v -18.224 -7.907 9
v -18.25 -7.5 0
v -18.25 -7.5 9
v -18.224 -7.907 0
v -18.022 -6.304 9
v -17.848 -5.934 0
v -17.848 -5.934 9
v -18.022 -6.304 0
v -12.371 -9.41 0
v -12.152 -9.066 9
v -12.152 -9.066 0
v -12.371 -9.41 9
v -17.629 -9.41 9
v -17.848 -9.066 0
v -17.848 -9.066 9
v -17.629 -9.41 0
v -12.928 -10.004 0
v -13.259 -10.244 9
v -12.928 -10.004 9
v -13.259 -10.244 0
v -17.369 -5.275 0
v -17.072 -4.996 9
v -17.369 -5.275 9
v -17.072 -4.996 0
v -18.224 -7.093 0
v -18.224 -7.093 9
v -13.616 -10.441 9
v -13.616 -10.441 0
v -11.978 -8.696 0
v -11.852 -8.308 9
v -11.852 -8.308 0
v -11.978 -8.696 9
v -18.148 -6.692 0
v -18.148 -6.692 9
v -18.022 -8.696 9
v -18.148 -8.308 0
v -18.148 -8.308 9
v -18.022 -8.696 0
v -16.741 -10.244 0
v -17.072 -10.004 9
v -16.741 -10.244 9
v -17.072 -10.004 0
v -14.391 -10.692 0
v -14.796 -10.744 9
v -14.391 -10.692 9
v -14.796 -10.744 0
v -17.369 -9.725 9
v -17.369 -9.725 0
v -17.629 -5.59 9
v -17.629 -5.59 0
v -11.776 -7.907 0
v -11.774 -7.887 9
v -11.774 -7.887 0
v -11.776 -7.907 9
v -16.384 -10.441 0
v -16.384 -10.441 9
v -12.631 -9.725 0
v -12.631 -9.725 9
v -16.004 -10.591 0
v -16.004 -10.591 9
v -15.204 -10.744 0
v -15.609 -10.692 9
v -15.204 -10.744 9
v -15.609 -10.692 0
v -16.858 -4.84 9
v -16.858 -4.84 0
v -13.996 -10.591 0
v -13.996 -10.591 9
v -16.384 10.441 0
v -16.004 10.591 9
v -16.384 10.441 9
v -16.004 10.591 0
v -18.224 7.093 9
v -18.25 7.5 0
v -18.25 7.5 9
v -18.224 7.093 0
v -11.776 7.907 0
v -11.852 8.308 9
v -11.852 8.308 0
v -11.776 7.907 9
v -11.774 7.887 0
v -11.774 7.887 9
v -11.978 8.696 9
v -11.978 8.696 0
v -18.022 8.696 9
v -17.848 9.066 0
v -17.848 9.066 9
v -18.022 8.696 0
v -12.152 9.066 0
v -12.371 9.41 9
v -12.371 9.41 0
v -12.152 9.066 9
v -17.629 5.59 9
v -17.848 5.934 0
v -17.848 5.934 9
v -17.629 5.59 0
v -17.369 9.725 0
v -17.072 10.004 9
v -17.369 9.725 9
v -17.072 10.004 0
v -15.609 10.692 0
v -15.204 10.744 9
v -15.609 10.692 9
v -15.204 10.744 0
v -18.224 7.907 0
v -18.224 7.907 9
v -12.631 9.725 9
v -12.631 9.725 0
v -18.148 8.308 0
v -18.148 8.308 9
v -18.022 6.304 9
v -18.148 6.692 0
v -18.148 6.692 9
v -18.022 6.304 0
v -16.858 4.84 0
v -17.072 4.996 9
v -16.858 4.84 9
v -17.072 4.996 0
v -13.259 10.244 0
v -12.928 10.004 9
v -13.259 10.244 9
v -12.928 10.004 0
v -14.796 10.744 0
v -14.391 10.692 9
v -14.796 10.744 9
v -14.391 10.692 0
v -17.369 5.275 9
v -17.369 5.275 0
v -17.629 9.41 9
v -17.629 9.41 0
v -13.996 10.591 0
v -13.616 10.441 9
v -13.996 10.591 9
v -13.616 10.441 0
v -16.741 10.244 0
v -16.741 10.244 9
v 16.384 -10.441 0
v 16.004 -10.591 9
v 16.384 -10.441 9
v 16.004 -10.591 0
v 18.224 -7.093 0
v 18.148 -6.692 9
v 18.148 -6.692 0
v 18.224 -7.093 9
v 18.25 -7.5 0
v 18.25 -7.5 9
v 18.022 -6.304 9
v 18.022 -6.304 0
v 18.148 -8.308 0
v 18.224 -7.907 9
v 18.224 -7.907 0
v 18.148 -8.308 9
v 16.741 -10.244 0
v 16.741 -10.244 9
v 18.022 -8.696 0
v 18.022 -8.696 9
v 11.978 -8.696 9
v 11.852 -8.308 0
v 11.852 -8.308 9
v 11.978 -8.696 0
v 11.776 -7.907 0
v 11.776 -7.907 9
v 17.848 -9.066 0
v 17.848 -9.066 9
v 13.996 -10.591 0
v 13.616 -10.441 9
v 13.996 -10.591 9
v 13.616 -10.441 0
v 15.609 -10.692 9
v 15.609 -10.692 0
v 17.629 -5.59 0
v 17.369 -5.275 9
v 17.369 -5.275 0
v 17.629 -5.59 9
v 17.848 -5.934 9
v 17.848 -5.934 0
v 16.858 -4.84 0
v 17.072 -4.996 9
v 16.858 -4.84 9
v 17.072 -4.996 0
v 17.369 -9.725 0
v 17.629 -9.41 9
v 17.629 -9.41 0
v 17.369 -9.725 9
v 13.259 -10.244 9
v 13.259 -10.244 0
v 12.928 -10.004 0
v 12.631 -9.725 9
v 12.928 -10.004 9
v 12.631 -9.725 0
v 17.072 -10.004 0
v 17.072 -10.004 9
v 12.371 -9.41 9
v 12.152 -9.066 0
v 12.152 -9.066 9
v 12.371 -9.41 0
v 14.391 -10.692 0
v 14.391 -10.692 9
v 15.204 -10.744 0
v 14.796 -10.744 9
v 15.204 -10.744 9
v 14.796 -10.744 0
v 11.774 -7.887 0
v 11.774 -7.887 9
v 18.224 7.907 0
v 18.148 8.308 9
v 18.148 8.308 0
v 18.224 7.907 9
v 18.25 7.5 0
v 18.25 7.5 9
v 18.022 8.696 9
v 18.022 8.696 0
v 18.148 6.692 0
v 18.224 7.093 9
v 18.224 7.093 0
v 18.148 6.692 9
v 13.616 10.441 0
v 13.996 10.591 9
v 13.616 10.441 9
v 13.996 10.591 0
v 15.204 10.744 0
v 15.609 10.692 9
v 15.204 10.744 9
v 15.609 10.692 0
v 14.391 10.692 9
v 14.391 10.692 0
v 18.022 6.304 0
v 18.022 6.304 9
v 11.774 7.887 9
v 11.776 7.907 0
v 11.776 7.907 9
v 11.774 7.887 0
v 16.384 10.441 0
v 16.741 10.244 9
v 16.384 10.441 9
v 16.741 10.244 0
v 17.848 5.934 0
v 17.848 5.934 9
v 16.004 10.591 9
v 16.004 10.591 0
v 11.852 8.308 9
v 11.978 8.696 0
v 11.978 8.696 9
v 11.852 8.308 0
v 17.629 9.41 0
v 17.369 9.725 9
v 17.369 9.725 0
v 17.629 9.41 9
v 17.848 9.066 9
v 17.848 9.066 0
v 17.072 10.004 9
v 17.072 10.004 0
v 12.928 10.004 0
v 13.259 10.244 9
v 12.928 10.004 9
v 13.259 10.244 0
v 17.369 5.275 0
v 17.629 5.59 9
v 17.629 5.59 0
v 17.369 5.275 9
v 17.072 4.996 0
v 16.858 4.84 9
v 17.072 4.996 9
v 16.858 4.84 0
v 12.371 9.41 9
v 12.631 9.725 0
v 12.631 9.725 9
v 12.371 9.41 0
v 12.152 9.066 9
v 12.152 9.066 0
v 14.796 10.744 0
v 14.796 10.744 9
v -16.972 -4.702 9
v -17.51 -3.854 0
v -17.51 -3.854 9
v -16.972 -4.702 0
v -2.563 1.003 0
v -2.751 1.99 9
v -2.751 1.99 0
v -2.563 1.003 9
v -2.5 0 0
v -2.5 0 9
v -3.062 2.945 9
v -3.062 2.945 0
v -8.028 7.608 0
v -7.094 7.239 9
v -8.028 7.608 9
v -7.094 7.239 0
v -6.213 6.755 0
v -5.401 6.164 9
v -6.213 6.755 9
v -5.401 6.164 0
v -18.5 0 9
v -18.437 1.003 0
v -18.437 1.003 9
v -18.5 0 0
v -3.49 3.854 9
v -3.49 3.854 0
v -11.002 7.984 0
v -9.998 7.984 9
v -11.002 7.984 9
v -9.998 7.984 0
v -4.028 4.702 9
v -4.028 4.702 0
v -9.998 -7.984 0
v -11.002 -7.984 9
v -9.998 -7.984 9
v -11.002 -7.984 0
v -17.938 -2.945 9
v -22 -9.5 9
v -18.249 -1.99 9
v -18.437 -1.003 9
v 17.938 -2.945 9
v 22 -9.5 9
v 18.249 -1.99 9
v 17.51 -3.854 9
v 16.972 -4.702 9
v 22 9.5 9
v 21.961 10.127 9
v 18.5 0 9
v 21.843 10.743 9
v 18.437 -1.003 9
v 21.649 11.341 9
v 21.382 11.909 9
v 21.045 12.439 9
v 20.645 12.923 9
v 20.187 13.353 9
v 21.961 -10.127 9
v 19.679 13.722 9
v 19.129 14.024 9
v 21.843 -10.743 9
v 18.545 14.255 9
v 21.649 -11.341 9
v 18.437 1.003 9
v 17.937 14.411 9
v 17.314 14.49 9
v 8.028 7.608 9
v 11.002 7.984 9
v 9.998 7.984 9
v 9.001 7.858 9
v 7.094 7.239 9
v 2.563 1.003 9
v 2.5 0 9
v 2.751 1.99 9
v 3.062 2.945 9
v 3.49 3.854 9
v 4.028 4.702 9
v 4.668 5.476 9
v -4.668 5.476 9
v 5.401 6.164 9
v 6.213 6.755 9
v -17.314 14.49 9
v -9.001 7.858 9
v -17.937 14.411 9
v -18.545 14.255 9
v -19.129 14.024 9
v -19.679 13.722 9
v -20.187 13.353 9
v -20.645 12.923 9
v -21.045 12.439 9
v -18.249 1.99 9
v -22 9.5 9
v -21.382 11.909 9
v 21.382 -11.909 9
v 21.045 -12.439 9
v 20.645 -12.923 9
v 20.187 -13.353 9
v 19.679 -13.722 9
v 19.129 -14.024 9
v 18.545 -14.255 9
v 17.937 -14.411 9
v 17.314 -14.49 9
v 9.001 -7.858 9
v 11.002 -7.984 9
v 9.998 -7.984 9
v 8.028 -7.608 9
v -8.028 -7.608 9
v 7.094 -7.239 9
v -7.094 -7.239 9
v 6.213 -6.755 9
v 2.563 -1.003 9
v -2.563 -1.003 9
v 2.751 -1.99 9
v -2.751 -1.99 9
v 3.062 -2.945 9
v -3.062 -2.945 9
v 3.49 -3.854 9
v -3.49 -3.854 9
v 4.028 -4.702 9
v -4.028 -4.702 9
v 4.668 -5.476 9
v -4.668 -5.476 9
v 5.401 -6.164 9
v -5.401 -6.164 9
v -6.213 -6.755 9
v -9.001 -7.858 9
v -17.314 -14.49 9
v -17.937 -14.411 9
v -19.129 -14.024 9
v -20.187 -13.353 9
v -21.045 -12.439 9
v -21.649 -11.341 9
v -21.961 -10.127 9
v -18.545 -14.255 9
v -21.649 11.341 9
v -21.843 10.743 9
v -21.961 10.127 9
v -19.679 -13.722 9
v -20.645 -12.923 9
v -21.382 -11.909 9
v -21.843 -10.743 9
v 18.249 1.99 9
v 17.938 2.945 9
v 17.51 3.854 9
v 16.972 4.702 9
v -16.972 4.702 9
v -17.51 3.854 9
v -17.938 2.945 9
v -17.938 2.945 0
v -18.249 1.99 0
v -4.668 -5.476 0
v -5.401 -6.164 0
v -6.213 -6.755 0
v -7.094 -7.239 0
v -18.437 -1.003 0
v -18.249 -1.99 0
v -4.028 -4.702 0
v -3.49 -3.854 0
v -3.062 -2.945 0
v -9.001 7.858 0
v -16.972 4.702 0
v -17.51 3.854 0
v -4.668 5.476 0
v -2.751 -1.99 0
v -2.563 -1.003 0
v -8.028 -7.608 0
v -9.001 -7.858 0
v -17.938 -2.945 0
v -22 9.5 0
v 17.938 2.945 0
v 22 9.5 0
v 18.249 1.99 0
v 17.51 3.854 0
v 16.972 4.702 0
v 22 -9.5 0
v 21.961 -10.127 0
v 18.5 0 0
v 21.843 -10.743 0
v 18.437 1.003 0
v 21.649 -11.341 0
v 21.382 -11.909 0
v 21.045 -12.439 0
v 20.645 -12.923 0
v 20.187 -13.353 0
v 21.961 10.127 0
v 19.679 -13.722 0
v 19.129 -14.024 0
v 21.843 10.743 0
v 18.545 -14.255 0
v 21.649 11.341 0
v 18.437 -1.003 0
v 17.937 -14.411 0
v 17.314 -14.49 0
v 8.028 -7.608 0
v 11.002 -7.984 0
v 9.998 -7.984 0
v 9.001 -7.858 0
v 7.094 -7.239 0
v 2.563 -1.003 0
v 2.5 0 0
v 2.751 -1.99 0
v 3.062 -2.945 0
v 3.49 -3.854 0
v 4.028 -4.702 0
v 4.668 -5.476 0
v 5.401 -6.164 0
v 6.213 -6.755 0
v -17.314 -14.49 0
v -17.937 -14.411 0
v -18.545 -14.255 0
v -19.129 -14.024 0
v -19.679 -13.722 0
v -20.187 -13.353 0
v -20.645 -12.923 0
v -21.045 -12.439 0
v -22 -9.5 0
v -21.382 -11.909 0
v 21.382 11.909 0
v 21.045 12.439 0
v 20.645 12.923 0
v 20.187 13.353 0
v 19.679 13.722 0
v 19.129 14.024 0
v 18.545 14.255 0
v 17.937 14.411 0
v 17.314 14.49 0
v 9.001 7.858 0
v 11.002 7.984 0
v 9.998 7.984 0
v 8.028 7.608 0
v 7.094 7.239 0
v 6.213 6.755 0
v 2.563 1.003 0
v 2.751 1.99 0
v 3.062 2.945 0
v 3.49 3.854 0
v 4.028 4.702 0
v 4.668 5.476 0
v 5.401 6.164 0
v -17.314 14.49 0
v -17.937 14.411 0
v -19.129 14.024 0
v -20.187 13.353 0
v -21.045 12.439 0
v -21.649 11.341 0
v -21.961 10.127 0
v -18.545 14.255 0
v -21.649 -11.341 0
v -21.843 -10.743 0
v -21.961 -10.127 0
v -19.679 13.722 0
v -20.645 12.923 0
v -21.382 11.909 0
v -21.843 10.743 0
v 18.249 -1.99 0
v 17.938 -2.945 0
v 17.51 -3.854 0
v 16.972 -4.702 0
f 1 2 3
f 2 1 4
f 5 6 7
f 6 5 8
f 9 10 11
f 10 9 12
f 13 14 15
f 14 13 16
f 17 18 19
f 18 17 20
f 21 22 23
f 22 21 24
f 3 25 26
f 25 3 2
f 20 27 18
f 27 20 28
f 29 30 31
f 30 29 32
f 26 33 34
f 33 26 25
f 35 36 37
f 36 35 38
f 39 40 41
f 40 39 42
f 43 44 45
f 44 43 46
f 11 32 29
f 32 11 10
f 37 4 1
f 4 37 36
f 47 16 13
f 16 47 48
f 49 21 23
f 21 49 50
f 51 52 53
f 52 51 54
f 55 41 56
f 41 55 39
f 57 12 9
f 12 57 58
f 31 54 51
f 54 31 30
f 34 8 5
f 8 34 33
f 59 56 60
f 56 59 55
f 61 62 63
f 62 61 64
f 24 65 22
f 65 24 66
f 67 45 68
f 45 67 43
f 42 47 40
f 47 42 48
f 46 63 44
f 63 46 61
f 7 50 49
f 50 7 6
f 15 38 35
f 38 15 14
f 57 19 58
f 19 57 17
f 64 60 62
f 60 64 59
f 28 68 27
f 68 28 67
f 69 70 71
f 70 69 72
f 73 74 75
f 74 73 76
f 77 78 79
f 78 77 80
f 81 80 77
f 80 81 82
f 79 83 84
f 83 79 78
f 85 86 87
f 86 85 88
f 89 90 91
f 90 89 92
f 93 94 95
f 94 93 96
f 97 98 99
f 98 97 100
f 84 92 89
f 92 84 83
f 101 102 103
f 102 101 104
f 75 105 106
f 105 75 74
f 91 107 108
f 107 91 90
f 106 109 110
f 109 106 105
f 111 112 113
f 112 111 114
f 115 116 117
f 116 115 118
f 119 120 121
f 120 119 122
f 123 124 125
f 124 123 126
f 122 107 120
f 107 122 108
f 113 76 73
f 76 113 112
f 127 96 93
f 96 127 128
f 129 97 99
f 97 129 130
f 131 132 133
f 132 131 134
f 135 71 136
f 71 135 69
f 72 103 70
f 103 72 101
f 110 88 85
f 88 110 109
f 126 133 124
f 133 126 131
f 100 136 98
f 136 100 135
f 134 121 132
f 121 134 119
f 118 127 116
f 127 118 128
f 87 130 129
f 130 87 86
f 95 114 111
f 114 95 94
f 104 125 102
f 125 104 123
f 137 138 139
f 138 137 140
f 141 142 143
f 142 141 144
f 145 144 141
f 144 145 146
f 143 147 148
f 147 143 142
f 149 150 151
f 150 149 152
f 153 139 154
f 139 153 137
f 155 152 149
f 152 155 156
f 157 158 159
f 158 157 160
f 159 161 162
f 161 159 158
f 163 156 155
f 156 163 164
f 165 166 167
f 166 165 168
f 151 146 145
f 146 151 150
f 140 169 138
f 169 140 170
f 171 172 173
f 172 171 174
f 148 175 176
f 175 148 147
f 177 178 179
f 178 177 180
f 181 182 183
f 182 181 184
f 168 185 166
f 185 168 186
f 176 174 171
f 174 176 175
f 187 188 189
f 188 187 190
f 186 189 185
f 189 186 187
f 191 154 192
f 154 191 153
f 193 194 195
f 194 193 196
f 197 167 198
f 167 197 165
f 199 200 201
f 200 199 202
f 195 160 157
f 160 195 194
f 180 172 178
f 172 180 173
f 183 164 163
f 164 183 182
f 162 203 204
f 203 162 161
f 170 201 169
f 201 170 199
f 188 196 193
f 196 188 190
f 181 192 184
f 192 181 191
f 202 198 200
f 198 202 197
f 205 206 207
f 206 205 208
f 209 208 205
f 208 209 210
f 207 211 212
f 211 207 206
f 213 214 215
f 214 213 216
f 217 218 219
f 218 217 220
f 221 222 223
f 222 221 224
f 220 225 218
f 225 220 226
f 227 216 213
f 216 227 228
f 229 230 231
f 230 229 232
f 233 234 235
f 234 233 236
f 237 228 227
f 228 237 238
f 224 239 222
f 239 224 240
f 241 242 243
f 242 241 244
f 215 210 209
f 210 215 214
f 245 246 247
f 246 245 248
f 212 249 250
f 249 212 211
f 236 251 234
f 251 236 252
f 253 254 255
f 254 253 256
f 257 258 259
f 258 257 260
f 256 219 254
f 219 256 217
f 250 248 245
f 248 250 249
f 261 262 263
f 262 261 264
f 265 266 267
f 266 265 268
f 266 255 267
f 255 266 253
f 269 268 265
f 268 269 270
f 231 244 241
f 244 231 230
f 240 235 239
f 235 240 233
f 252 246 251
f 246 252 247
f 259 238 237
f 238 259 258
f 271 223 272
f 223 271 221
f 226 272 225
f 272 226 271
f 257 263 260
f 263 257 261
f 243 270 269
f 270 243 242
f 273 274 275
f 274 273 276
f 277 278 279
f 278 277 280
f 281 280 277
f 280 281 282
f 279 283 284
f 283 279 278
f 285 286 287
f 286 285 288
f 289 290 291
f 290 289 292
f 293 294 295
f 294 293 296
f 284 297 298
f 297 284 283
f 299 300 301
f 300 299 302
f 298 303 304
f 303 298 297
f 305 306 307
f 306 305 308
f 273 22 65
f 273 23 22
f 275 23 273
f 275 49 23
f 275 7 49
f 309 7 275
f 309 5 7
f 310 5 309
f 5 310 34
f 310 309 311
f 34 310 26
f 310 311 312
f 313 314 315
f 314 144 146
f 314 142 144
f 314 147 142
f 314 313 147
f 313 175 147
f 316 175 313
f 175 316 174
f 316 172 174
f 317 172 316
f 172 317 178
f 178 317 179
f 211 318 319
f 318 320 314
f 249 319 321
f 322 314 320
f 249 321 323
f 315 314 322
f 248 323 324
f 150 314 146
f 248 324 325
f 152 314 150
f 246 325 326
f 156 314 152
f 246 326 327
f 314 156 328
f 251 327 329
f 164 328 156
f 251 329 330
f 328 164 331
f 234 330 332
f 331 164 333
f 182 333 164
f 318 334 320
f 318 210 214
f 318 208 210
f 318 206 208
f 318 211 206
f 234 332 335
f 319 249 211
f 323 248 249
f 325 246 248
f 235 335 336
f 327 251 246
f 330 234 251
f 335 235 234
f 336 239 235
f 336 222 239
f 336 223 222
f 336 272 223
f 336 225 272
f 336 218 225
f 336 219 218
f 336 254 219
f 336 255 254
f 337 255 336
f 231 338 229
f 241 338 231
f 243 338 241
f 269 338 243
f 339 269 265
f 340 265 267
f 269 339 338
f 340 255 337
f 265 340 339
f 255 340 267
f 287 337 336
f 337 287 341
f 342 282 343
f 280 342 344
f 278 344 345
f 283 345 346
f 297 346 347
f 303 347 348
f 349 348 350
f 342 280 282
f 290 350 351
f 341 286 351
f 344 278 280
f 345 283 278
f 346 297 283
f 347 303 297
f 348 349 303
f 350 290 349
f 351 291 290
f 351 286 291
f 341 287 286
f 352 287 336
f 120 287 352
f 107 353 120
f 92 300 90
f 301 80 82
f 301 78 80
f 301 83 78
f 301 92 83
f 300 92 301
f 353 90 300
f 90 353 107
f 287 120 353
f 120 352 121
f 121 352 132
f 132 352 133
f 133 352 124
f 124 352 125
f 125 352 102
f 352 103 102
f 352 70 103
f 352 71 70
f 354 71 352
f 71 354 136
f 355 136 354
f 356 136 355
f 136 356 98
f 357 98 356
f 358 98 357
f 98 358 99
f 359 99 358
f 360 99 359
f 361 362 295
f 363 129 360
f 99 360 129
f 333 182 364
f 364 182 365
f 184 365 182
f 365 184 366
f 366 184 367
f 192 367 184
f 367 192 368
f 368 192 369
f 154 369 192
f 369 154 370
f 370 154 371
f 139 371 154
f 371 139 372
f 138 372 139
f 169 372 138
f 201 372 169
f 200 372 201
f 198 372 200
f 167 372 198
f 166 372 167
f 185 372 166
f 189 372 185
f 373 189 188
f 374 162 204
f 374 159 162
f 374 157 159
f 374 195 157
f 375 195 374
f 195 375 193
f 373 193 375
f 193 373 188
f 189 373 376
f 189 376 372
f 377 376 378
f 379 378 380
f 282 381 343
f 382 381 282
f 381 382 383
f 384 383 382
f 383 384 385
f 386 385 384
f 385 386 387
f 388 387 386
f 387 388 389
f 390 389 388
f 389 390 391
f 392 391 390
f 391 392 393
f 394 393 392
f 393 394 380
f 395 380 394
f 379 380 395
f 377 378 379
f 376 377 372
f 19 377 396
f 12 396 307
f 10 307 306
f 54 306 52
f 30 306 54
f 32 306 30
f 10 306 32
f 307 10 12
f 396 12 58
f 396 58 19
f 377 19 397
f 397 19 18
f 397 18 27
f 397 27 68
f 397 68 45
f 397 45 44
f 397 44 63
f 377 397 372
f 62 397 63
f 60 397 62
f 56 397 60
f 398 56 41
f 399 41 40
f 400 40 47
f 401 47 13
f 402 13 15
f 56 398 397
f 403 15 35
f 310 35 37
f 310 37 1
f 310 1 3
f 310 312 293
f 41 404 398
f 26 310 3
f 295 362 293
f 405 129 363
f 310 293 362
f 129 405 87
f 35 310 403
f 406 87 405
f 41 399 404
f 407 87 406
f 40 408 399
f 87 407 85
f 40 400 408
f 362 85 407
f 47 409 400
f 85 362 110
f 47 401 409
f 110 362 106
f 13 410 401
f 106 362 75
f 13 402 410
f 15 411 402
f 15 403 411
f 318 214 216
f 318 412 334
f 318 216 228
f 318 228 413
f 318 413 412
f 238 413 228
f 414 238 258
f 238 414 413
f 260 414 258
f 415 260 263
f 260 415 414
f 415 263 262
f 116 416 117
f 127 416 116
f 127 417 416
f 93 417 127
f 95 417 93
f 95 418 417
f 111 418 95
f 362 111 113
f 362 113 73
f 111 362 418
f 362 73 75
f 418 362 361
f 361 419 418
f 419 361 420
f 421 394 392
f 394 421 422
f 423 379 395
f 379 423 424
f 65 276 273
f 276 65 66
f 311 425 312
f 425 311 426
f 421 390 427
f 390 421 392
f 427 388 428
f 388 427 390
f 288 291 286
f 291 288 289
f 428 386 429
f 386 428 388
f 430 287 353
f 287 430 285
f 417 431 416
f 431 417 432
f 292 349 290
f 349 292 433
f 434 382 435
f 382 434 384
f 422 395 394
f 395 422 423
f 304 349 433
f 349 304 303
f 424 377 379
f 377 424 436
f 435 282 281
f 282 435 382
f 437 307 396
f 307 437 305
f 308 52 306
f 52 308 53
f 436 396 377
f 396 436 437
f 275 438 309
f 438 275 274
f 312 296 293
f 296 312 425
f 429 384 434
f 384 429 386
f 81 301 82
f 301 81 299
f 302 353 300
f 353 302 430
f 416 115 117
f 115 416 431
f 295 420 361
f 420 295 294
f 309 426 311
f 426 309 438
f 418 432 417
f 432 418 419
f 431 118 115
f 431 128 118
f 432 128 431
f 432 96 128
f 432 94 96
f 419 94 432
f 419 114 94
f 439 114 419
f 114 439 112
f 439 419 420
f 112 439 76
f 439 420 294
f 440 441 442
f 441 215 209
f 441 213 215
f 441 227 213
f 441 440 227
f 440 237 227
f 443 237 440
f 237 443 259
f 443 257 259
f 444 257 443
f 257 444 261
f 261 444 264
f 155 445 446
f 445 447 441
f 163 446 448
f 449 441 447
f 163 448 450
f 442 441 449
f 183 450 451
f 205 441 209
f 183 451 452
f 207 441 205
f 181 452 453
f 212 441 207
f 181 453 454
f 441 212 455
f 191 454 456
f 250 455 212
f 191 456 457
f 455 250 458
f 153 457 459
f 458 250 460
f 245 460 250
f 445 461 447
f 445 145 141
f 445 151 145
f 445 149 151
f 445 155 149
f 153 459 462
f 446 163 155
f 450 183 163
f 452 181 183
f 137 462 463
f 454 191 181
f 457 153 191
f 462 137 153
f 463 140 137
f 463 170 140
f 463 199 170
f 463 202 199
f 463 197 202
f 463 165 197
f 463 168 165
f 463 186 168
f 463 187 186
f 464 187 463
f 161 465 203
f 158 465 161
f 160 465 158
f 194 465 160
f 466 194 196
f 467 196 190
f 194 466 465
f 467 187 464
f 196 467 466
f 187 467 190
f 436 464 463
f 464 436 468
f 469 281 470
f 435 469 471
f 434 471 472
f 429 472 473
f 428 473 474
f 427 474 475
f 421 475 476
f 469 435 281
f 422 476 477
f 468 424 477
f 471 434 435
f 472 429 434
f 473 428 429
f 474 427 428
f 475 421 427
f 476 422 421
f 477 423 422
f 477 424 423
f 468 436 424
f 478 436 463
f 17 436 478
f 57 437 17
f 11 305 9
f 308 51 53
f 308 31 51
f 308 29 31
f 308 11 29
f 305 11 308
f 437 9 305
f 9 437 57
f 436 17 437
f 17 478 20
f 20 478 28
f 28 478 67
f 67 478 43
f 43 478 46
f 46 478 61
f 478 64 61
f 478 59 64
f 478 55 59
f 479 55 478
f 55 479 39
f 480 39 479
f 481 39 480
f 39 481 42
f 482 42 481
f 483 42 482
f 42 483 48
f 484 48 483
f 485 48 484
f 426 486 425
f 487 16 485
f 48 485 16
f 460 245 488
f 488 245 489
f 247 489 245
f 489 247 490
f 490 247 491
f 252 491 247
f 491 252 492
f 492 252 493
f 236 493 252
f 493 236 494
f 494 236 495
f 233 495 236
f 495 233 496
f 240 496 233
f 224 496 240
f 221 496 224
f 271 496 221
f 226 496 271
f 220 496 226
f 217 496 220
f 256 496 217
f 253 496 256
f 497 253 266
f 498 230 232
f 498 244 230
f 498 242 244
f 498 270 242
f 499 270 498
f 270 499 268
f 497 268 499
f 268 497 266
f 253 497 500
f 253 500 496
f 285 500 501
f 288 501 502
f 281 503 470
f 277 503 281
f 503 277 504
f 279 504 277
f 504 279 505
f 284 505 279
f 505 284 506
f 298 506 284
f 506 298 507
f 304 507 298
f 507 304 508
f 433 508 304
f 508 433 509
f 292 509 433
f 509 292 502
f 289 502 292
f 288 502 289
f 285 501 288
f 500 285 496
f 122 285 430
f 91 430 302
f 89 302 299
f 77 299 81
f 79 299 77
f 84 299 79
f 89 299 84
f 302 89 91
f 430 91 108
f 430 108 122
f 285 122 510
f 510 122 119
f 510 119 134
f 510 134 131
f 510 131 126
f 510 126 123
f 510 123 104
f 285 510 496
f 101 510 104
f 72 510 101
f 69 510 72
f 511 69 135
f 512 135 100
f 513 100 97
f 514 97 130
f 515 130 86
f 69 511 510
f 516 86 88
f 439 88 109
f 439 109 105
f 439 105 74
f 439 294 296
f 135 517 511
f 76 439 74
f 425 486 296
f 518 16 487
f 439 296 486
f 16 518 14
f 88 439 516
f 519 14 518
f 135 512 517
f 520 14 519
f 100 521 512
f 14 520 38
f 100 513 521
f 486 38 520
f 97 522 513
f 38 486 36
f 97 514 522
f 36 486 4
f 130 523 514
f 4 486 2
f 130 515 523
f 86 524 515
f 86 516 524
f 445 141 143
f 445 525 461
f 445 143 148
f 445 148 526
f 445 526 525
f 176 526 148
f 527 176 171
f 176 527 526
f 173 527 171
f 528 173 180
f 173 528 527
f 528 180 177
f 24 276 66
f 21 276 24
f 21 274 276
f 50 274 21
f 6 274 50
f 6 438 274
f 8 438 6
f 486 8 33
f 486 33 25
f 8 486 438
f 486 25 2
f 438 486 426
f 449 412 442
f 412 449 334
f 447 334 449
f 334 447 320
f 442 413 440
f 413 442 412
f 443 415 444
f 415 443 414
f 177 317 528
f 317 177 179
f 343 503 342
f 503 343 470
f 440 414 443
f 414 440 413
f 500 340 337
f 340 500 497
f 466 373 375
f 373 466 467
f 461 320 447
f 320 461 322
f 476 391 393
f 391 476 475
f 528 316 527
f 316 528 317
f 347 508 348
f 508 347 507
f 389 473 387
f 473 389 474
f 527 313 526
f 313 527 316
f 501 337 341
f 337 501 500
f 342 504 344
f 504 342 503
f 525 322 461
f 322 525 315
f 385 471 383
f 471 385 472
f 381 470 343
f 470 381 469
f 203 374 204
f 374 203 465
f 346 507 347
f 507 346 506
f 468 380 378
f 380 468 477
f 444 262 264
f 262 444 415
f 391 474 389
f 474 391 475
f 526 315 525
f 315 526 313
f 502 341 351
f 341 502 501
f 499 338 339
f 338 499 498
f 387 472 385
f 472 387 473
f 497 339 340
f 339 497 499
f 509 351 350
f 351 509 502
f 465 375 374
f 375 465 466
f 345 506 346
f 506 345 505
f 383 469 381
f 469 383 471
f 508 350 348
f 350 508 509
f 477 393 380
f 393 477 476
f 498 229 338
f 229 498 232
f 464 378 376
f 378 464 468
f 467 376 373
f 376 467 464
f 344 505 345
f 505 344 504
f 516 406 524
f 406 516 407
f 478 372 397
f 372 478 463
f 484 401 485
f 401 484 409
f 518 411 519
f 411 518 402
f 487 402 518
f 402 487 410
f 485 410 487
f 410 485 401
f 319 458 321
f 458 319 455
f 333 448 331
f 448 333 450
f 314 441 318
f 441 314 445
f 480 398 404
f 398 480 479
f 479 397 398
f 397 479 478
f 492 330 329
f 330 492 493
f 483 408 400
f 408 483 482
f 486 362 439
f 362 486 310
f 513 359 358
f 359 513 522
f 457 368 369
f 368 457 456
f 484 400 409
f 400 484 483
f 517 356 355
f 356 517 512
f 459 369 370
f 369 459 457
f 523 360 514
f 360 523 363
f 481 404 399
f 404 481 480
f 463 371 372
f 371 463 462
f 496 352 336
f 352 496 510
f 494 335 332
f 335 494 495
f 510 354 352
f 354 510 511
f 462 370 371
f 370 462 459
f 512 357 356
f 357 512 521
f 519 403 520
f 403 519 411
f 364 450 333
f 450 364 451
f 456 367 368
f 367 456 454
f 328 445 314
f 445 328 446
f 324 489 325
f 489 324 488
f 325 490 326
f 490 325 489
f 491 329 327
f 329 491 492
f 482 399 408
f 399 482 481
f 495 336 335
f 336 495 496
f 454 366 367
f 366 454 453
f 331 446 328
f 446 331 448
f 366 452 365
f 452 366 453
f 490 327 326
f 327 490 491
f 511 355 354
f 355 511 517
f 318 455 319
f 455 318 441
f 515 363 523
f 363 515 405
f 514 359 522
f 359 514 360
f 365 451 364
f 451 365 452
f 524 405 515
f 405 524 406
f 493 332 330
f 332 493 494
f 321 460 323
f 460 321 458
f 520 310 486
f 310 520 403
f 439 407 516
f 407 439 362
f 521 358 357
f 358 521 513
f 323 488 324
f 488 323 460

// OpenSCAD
$fn = 50;


difference() {
	union() {
		hull() {
			translate(v = [-17.0000000000, 9.5000000000, 0]) {
				cylinder(h = 9, r = 5);
			}
			translate(v = [17.0000000000, 9.5000000000, 0]) {
				cylinder(h = 9, r = 5);
			}
			translate(v = [-17.0000000000, -9.5000000000, 0]) {
				cylinder(h = 9, r = 5);
			}
			translate(v = [17.0000000000, -9.5000000000, 0]) {
				cylinder(h = 9, r = 5);
			}
		}
	}
	union() {
		#translate(v = [-15.0000000000, -7.5000000000, -100.0000000000]) {
			cylinder(h = 200, r = 3.2500000000);
		}
		#translate(v = [-15.0000000000, 7.5000000000, -100.0000000000]) {
			cylinder(h = 200, r = 3.2500000000);
		}
		#translate(v = [15.0000000000, -7.5000000000, -100.0000000000]) {
			cylinder(h = 200, r = 3.2500000000);
		}
		#translate(v = [15.0000000000, 7.5000000000, -100.0000000000]) {
			cylinder(h = 200, r = 3.2500000000);
		}
		#translate(v = [-10.5000000000, 0, 0]) {
			cylinder(h = 9, r = 8.0000000000);
		}
		#translate(v = [10.5000000000, 0, 0]) {
			cylinder(h = 9, r = 8.0000000000);
		}
	}
}
